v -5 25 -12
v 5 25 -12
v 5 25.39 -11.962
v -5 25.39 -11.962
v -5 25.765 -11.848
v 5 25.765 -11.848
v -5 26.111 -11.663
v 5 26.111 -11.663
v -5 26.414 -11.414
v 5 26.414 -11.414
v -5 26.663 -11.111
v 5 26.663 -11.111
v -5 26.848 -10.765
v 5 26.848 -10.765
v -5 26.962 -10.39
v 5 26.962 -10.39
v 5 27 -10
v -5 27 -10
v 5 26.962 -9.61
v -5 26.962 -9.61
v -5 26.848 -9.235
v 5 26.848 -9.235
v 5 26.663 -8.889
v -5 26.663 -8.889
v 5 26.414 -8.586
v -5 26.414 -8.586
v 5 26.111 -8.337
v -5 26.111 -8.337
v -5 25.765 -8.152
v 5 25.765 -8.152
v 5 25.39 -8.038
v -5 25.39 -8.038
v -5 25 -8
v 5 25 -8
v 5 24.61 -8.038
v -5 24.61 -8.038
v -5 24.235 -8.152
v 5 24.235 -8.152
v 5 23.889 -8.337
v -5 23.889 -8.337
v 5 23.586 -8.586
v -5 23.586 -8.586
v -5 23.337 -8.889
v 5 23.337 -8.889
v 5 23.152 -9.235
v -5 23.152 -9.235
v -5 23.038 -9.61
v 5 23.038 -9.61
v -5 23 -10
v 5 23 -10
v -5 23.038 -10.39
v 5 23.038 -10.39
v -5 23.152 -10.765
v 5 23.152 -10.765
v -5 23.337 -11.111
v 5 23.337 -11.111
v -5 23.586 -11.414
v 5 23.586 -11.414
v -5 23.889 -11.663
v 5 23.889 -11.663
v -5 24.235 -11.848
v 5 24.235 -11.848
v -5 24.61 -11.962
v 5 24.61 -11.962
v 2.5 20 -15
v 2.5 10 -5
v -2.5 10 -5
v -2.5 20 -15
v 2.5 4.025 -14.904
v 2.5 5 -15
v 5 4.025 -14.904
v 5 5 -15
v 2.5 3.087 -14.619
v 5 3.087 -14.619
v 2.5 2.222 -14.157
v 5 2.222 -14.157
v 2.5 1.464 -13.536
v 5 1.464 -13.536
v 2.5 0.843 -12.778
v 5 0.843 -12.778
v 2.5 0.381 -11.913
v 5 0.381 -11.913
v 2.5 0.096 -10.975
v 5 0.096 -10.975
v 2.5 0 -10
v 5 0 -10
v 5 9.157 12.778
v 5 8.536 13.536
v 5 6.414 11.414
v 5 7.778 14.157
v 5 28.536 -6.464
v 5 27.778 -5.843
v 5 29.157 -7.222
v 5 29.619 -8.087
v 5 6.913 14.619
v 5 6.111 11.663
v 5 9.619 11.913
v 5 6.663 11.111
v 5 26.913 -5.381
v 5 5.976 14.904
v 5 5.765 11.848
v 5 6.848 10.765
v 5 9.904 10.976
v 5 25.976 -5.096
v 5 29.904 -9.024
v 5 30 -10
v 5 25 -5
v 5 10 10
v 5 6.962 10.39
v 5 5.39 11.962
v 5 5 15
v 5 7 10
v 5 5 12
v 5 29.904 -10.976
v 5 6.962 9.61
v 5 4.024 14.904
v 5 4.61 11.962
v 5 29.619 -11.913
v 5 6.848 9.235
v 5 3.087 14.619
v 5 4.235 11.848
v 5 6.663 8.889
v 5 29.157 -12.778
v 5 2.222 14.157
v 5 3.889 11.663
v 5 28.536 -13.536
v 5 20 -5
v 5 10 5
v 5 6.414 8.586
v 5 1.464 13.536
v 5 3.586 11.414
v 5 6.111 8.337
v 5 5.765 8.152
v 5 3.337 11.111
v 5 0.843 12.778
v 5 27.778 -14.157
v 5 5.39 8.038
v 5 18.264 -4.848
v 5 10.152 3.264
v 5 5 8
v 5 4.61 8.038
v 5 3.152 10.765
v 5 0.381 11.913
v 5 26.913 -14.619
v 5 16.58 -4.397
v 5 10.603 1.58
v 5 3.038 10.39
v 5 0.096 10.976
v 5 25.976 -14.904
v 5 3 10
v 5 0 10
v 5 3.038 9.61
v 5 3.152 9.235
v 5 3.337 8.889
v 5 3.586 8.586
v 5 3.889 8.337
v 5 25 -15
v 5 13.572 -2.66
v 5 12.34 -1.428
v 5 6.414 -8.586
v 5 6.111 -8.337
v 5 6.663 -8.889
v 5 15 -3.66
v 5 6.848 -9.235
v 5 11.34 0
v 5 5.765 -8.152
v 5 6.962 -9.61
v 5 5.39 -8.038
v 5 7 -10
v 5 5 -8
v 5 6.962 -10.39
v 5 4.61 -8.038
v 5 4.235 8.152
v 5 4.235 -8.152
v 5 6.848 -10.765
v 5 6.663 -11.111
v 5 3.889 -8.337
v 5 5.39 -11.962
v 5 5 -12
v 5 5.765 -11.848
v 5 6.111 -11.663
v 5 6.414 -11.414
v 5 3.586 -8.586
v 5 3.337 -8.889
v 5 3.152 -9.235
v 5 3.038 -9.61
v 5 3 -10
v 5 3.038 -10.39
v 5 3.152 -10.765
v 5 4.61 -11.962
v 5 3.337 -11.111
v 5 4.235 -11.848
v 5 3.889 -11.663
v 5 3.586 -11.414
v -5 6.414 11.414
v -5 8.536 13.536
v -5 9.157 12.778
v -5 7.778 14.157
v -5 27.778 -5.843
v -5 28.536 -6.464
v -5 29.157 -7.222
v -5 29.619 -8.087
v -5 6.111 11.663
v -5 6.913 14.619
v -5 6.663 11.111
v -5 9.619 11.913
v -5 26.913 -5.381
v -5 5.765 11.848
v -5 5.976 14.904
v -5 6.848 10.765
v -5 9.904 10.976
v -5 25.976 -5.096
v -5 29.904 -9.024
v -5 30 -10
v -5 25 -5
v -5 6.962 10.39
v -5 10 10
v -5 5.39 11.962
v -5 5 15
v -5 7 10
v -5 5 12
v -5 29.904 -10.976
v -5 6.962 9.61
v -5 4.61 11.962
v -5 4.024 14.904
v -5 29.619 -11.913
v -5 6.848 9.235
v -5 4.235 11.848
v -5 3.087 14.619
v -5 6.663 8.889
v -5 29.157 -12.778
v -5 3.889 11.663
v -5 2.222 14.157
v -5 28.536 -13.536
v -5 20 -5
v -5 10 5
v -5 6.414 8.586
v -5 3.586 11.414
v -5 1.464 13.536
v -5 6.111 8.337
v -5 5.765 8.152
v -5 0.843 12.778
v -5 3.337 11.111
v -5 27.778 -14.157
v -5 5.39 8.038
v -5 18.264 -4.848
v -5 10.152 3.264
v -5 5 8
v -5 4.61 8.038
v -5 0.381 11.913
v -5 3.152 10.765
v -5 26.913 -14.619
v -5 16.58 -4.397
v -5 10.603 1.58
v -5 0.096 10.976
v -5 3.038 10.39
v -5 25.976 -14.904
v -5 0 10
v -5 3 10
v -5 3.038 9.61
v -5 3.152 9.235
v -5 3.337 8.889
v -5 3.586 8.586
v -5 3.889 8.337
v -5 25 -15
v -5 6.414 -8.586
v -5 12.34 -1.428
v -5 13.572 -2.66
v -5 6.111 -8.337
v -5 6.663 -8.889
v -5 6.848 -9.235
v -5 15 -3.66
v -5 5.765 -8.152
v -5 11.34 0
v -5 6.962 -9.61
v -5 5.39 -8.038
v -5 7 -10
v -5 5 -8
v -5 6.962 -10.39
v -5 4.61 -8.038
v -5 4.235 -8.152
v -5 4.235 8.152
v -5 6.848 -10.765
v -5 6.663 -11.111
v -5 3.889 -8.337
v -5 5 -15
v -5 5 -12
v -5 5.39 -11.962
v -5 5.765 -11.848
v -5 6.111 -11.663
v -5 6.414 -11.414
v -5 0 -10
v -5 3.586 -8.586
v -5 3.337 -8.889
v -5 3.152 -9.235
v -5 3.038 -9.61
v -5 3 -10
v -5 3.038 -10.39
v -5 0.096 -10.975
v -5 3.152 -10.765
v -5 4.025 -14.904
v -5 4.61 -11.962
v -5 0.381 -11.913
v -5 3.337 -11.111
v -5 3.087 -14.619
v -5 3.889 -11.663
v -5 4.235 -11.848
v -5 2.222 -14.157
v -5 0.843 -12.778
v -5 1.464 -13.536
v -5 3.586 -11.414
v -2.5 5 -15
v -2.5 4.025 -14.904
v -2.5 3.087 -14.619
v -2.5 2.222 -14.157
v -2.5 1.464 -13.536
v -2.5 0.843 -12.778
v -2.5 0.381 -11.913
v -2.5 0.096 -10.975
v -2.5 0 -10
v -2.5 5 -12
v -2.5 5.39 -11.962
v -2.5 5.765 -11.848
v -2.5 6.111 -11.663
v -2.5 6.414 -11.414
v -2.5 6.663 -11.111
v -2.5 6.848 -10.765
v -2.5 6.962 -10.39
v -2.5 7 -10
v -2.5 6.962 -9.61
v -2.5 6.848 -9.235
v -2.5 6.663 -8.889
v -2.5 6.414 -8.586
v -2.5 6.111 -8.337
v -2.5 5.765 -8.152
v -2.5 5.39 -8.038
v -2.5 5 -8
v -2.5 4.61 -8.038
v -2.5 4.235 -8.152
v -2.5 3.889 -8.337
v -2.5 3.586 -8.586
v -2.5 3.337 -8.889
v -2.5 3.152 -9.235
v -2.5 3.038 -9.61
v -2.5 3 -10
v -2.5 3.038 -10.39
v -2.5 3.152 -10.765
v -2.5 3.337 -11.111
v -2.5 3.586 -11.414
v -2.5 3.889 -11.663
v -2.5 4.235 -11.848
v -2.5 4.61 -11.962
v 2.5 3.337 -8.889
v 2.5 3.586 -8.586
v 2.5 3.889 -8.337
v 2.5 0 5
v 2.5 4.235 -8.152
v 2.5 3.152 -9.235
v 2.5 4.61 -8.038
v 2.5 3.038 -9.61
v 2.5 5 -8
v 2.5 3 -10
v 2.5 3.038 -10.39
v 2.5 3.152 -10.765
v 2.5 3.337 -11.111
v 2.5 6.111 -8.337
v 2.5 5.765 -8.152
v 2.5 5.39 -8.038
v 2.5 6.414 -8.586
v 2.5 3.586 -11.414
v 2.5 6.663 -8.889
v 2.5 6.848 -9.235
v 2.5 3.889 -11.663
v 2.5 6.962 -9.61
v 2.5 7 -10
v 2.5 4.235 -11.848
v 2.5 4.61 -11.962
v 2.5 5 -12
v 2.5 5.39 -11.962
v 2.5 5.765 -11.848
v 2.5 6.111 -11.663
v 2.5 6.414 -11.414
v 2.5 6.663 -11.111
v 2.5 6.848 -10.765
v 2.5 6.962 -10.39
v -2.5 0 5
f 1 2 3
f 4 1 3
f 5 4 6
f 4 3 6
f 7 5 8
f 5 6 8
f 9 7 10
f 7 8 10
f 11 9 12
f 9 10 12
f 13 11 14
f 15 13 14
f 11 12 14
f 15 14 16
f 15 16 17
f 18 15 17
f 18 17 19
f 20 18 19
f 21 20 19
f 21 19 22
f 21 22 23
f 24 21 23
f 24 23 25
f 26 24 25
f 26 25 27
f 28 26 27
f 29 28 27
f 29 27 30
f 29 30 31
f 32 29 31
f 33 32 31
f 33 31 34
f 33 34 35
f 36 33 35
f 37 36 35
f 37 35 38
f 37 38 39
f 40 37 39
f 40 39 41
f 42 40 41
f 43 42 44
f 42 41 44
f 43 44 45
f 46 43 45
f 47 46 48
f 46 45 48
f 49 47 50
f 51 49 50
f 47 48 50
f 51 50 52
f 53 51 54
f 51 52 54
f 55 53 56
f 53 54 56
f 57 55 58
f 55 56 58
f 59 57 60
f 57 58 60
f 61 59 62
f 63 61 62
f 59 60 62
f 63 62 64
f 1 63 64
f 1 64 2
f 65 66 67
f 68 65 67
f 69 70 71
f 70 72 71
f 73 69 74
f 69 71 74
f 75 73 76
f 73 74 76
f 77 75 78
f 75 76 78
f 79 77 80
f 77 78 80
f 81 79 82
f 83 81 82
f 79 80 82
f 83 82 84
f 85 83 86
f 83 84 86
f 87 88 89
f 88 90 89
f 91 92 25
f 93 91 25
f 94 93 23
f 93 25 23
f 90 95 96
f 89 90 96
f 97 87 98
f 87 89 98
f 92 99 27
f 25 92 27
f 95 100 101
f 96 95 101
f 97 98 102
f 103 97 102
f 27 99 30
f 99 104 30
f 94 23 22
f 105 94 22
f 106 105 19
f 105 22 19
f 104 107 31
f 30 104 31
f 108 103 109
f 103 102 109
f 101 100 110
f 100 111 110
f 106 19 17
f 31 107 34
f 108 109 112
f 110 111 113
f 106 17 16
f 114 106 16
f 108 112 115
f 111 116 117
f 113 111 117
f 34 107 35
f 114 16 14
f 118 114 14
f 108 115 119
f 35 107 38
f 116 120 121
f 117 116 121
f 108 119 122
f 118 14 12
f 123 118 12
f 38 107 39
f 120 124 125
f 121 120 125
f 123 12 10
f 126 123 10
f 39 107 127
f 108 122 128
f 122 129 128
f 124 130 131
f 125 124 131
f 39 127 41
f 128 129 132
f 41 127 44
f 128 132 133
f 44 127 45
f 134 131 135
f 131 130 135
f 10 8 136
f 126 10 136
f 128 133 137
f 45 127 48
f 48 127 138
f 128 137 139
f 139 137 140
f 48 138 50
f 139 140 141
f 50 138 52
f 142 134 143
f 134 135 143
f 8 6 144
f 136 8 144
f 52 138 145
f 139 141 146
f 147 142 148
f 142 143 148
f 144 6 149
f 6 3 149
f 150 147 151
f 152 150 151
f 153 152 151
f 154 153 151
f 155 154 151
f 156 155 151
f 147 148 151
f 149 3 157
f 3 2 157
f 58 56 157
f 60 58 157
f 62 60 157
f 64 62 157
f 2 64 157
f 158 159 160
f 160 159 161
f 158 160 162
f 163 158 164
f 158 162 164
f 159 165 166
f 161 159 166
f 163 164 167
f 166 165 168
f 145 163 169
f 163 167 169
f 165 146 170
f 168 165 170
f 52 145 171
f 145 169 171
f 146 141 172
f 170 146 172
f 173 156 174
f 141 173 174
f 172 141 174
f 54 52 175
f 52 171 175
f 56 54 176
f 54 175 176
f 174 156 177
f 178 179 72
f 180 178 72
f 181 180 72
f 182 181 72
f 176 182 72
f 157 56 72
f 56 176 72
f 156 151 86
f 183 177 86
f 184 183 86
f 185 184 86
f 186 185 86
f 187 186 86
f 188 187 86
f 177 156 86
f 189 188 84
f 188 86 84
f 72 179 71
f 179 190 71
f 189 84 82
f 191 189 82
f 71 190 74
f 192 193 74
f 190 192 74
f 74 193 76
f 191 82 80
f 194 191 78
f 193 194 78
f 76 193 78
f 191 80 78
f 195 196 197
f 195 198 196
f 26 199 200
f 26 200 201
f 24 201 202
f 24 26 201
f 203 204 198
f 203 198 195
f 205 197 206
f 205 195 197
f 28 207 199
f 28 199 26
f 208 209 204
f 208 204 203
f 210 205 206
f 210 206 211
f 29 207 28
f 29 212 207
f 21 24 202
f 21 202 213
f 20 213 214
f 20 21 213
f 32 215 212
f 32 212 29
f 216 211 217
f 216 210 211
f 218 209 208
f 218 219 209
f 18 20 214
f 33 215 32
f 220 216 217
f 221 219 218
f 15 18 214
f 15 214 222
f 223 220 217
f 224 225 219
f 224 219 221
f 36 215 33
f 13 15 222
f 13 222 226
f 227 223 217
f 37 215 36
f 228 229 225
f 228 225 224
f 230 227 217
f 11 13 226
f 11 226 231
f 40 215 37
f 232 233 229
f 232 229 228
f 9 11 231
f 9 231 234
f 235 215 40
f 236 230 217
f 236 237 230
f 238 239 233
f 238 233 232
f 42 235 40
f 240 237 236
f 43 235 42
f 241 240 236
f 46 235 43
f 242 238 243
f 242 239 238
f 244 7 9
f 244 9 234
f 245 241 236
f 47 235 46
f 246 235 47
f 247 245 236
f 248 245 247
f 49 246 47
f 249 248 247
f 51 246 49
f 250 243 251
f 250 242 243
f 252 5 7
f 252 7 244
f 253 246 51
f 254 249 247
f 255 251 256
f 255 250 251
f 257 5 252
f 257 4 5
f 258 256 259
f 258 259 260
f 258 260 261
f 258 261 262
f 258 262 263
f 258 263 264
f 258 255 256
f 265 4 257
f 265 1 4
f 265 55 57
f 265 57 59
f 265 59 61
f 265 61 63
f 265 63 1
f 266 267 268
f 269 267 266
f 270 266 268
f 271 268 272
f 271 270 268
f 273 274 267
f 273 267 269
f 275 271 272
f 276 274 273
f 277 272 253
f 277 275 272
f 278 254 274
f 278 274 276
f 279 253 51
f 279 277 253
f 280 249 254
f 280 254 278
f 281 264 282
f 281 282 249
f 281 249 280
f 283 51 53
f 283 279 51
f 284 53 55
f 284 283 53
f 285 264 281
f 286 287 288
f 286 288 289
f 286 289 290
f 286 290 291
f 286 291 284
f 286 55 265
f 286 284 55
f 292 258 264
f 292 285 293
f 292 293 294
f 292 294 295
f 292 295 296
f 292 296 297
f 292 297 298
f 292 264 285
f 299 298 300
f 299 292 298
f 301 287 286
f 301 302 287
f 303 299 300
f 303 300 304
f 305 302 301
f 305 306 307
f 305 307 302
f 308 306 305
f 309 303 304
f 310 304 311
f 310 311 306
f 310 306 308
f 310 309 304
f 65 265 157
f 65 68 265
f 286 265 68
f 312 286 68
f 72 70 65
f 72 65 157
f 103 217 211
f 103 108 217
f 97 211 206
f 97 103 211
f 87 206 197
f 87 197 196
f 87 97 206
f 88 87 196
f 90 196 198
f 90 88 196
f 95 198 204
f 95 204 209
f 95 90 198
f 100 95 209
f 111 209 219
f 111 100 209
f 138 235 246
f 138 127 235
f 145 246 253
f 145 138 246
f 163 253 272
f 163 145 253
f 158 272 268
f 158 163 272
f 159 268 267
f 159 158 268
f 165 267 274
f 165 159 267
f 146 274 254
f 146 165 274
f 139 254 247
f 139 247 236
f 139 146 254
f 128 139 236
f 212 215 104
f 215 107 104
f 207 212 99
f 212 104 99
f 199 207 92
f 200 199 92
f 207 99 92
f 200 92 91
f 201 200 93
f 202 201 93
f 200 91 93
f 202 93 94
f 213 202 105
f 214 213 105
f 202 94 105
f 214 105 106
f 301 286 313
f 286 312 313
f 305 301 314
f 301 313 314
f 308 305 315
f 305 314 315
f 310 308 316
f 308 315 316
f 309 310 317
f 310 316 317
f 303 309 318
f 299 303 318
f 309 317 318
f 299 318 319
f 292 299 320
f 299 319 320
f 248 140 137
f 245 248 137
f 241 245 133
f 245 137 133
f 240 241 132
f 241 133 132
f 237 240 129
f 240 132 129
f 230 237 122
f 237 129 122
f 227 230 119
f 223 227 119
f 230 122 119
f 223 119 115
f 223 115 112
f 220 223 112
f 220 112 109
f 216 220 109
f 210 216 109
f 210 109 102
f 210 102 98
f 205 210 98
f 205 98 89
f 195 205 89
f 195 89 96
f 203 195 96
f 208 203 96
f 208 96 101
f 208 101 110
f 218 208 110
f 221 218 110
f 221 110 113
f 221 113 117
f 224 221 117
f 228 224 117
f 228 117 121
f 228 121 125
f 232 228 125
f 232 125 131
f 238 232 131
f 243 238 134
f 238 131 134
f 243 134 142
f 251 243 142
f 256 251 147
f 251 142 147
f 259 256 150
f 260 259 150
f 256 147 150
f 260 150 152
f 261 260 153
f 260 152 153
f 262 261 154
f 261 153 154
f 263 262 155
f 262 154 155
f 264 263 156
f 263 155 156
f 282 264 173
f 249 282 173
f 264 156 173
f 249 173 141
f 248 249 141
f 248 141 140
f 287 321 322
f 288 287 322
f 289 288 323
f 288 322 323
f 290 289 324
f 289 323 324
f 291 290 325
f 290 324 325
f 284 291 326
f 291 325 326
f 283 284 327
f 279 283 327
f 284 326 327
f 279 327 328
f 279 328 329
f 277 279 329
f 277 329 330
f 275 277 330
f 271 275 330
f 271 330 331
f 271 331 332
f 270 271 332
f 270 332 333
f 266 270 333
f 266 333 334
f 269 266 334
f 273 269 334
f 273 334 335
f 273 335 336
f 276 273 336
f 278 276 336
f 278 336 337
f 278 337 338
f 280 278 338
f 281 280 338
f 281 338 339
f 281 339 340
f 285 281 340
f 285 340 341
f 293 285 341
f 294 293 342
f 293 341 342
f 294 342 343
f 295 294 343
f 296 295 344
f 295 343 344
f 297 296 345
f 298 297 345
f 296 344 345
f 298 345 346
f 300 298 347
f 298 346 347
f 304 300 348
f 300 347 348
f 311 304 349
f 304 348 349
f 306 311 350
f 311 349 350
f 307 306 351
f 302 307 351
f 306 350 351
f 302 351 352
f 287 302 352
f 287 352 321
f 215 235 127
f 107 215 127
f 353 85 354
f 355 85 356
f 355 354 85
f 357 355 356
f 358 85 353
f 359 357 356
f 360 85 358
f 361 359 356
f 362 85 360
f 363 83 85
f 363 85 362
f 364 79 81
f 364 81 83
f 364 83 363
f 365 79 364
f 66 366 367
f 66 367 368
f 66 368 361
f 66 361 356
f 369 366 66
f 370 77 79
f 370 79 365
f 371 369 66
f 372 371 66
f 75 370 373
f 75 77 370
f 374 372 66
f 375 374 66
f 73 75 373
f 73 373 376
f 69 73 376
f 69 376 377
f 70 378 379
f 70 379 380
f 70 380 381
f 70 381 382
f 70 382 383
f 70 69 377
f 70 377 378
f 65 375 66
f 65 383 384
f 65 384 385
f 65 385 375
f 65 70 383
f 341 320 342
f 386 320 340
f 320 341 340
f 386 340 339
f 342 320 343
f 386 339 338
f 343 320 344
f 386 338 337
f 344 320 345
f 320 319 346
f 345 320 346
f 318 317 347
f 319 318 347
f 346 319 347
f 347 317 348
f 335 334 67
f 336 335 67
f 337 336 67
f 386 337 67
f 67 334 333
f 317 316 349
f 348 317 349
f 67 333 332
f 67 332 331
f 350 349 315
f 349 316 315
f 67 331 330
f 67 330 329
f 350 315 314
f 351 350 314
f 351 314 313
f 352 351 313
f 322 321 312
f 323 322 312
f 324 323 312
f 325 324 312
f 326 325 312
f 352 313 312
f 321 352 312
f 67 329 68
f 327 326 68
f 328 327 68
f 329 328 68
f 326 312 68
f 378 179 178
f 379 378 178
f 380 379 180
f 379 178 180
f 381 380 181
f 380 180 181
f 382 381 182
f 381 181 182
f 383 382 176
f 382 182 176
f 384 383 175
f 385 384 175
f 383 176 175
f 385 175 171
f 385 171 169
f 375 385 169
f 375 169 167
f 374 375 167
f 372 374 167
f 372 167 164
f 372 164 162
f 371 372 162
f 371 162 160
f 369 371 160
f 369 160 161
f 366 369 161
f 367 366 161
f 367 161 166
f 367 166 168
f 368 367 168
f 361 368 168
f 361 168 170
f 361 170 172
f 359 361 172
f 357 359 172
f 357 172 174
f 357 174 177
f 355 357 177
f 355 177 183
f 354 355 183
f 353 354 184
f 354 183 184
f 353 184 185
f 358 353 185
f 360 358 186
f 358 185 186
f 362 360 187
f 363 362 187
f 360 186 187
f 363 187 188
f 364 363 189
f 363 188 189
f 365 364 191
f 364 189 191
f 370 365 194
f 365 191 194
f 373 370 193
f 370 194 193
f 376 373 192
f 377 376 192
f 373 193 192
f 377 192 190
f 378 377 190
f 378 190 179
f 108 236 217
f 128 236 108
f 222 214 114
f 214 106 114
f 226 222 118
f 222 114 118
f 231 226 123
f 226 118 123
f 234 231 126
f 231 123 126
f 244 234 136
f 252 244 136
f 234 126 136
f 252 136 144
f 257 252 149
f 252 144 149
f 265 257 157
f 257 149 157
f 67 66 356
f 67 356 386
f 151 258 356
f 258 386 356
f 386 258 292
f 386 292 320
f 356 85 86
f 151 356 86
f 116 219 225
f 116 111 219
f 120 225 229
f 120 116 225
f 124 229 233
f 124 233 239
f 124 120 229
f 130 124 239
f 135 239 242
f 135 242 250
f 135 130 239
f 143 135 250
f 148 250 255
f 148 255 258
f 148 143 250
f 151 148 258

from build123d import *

# Parameters (mm, degrees)
SKETCH1_W           = 10
SKETCH1_H           = 30
BOSS_EXTRUDE1_DEPTH = 10
SKETCH2_W           = 10
SKETCH2_H           = 10
BOSS_EXTRUDE2_DEPTH = 20
SKETCH3_R           = 2
CUT_EXTRUDE1_DEPTH  = 36
FILLET1_R           = 5
FILLET2_R           = 10
SKETCH6_W           = 5
SKETCH6_H           = 10
CUT_EXTRUDE3_DEPTH  = 10
CHAMFER1_SIZE       = 10
SKETCH4_R           = 2
CUT_EXTRUDE4_DEPTH  = 36
FILLET3_R           = 5


with BuildPart() as part:
    # Sketch1 → Boss-Extrude1 (new body)
    with BuildSketch(Plane(origin=(0, 0, 0), x_dir=(1, 0, 0), z_dir=(0, 1, 0))):
        Rectangle(SKETCH1_W, SKETCH1_H)
    extrude(amount=BOSS_EXTRUDE1_DEPTH)

    # Sketch2 → Boss-Extrude2 (add)
    with BuildSketch(Plane(origin=(0, 10, 0), x_dir=(1, 0, 0), z_dir=(0, 1, 0))):
        with Locations((0, 10)):
            Rectangle(SKETCH2_W, SKETCH2_H)
    extrude(amount=BOSS_EXTRUDE2_DEPTH)

    # Sketch3 → Cut-Extrude1 (cut, through all)
    with BuildSketch(Plane(origin=(5, 0, 0), x_dir=(0, 0, -1), z_dir=(1, 0, 0))):
        with Locations((-10, 5)):
            Circle(SKETCH3_R)
        with Locations((10, 25)):
            Circle(SKETCH3_R)
    extrude(amount=-CUT_EXTRUDE1_DEPTH, mode=Mode.SUBTRACT)

    # Fillet1
    fillet1_edges = [part.edges().sort_by_distance(p)[0] for p in [
        (0, 30, -15),
        (0, 30, -5),
        (0, 0, 15),
        (0, 10, 15),
    ]]
    fillet(fillet1_edges, radius=FILLET1_R - 0.0001)  # a hair under: the kernel refuses the full size

    # Fillet2
    fillet2_edges = [part.edges().sort_by_distance(p)[0] for p in [
        (0, 10, -5),
    ]]
    fillet(fillet2_edges, radius=FILLET2_R)

    # Sketch6 → Cut-Extrude3 (cut)
    with BuildSketch(Plane(origin=(0, 0, -15), x_dir=(-1, 0, 0), z_dir=(0, 0, -1))):
        with Locations((0, 5)):
            Rectangle(SKETCH6_W, SKETCH6_H)
    extrude(amount=-CUT_EXTRUDE3_DEPTH, mode=Mode.SUBTRACT)

    # Chamfer1
    chamfer1_edges = [part.edges().sort_by_distance(p)[0] for p in [
        (0, 0, -5),
        (0, 10, -15),
    ]]
    chamfer(chamfer1_edges, length=CHAMFER1_SIZE - 0.0001)  # a hair under: the kernel refuses the full size

    # Sketch4 → Cut-Extrude4 (cut, through all)
    with BuildSketch(Plane(origin=(5, 0, 0), x_dir=(0, 0, -1), z_dir=(1, 0, 0))):
        with Locations((10, 5)):
            Circle(SKETCH4_R)
    extrude(amount=-CUT_EXTRUDE4_DEPTH, mode=Mode.SUBTRACT)

    # Fillet3
    fillet3_edges = [part.edges().sort_by_distance(p)[0] for p in [
        (3.75, 0, -15),
        (-3.75, 0, -15),
    ]]
    fillet(fillet3_edges, radius=FILLET3_R)


solid = part.part
